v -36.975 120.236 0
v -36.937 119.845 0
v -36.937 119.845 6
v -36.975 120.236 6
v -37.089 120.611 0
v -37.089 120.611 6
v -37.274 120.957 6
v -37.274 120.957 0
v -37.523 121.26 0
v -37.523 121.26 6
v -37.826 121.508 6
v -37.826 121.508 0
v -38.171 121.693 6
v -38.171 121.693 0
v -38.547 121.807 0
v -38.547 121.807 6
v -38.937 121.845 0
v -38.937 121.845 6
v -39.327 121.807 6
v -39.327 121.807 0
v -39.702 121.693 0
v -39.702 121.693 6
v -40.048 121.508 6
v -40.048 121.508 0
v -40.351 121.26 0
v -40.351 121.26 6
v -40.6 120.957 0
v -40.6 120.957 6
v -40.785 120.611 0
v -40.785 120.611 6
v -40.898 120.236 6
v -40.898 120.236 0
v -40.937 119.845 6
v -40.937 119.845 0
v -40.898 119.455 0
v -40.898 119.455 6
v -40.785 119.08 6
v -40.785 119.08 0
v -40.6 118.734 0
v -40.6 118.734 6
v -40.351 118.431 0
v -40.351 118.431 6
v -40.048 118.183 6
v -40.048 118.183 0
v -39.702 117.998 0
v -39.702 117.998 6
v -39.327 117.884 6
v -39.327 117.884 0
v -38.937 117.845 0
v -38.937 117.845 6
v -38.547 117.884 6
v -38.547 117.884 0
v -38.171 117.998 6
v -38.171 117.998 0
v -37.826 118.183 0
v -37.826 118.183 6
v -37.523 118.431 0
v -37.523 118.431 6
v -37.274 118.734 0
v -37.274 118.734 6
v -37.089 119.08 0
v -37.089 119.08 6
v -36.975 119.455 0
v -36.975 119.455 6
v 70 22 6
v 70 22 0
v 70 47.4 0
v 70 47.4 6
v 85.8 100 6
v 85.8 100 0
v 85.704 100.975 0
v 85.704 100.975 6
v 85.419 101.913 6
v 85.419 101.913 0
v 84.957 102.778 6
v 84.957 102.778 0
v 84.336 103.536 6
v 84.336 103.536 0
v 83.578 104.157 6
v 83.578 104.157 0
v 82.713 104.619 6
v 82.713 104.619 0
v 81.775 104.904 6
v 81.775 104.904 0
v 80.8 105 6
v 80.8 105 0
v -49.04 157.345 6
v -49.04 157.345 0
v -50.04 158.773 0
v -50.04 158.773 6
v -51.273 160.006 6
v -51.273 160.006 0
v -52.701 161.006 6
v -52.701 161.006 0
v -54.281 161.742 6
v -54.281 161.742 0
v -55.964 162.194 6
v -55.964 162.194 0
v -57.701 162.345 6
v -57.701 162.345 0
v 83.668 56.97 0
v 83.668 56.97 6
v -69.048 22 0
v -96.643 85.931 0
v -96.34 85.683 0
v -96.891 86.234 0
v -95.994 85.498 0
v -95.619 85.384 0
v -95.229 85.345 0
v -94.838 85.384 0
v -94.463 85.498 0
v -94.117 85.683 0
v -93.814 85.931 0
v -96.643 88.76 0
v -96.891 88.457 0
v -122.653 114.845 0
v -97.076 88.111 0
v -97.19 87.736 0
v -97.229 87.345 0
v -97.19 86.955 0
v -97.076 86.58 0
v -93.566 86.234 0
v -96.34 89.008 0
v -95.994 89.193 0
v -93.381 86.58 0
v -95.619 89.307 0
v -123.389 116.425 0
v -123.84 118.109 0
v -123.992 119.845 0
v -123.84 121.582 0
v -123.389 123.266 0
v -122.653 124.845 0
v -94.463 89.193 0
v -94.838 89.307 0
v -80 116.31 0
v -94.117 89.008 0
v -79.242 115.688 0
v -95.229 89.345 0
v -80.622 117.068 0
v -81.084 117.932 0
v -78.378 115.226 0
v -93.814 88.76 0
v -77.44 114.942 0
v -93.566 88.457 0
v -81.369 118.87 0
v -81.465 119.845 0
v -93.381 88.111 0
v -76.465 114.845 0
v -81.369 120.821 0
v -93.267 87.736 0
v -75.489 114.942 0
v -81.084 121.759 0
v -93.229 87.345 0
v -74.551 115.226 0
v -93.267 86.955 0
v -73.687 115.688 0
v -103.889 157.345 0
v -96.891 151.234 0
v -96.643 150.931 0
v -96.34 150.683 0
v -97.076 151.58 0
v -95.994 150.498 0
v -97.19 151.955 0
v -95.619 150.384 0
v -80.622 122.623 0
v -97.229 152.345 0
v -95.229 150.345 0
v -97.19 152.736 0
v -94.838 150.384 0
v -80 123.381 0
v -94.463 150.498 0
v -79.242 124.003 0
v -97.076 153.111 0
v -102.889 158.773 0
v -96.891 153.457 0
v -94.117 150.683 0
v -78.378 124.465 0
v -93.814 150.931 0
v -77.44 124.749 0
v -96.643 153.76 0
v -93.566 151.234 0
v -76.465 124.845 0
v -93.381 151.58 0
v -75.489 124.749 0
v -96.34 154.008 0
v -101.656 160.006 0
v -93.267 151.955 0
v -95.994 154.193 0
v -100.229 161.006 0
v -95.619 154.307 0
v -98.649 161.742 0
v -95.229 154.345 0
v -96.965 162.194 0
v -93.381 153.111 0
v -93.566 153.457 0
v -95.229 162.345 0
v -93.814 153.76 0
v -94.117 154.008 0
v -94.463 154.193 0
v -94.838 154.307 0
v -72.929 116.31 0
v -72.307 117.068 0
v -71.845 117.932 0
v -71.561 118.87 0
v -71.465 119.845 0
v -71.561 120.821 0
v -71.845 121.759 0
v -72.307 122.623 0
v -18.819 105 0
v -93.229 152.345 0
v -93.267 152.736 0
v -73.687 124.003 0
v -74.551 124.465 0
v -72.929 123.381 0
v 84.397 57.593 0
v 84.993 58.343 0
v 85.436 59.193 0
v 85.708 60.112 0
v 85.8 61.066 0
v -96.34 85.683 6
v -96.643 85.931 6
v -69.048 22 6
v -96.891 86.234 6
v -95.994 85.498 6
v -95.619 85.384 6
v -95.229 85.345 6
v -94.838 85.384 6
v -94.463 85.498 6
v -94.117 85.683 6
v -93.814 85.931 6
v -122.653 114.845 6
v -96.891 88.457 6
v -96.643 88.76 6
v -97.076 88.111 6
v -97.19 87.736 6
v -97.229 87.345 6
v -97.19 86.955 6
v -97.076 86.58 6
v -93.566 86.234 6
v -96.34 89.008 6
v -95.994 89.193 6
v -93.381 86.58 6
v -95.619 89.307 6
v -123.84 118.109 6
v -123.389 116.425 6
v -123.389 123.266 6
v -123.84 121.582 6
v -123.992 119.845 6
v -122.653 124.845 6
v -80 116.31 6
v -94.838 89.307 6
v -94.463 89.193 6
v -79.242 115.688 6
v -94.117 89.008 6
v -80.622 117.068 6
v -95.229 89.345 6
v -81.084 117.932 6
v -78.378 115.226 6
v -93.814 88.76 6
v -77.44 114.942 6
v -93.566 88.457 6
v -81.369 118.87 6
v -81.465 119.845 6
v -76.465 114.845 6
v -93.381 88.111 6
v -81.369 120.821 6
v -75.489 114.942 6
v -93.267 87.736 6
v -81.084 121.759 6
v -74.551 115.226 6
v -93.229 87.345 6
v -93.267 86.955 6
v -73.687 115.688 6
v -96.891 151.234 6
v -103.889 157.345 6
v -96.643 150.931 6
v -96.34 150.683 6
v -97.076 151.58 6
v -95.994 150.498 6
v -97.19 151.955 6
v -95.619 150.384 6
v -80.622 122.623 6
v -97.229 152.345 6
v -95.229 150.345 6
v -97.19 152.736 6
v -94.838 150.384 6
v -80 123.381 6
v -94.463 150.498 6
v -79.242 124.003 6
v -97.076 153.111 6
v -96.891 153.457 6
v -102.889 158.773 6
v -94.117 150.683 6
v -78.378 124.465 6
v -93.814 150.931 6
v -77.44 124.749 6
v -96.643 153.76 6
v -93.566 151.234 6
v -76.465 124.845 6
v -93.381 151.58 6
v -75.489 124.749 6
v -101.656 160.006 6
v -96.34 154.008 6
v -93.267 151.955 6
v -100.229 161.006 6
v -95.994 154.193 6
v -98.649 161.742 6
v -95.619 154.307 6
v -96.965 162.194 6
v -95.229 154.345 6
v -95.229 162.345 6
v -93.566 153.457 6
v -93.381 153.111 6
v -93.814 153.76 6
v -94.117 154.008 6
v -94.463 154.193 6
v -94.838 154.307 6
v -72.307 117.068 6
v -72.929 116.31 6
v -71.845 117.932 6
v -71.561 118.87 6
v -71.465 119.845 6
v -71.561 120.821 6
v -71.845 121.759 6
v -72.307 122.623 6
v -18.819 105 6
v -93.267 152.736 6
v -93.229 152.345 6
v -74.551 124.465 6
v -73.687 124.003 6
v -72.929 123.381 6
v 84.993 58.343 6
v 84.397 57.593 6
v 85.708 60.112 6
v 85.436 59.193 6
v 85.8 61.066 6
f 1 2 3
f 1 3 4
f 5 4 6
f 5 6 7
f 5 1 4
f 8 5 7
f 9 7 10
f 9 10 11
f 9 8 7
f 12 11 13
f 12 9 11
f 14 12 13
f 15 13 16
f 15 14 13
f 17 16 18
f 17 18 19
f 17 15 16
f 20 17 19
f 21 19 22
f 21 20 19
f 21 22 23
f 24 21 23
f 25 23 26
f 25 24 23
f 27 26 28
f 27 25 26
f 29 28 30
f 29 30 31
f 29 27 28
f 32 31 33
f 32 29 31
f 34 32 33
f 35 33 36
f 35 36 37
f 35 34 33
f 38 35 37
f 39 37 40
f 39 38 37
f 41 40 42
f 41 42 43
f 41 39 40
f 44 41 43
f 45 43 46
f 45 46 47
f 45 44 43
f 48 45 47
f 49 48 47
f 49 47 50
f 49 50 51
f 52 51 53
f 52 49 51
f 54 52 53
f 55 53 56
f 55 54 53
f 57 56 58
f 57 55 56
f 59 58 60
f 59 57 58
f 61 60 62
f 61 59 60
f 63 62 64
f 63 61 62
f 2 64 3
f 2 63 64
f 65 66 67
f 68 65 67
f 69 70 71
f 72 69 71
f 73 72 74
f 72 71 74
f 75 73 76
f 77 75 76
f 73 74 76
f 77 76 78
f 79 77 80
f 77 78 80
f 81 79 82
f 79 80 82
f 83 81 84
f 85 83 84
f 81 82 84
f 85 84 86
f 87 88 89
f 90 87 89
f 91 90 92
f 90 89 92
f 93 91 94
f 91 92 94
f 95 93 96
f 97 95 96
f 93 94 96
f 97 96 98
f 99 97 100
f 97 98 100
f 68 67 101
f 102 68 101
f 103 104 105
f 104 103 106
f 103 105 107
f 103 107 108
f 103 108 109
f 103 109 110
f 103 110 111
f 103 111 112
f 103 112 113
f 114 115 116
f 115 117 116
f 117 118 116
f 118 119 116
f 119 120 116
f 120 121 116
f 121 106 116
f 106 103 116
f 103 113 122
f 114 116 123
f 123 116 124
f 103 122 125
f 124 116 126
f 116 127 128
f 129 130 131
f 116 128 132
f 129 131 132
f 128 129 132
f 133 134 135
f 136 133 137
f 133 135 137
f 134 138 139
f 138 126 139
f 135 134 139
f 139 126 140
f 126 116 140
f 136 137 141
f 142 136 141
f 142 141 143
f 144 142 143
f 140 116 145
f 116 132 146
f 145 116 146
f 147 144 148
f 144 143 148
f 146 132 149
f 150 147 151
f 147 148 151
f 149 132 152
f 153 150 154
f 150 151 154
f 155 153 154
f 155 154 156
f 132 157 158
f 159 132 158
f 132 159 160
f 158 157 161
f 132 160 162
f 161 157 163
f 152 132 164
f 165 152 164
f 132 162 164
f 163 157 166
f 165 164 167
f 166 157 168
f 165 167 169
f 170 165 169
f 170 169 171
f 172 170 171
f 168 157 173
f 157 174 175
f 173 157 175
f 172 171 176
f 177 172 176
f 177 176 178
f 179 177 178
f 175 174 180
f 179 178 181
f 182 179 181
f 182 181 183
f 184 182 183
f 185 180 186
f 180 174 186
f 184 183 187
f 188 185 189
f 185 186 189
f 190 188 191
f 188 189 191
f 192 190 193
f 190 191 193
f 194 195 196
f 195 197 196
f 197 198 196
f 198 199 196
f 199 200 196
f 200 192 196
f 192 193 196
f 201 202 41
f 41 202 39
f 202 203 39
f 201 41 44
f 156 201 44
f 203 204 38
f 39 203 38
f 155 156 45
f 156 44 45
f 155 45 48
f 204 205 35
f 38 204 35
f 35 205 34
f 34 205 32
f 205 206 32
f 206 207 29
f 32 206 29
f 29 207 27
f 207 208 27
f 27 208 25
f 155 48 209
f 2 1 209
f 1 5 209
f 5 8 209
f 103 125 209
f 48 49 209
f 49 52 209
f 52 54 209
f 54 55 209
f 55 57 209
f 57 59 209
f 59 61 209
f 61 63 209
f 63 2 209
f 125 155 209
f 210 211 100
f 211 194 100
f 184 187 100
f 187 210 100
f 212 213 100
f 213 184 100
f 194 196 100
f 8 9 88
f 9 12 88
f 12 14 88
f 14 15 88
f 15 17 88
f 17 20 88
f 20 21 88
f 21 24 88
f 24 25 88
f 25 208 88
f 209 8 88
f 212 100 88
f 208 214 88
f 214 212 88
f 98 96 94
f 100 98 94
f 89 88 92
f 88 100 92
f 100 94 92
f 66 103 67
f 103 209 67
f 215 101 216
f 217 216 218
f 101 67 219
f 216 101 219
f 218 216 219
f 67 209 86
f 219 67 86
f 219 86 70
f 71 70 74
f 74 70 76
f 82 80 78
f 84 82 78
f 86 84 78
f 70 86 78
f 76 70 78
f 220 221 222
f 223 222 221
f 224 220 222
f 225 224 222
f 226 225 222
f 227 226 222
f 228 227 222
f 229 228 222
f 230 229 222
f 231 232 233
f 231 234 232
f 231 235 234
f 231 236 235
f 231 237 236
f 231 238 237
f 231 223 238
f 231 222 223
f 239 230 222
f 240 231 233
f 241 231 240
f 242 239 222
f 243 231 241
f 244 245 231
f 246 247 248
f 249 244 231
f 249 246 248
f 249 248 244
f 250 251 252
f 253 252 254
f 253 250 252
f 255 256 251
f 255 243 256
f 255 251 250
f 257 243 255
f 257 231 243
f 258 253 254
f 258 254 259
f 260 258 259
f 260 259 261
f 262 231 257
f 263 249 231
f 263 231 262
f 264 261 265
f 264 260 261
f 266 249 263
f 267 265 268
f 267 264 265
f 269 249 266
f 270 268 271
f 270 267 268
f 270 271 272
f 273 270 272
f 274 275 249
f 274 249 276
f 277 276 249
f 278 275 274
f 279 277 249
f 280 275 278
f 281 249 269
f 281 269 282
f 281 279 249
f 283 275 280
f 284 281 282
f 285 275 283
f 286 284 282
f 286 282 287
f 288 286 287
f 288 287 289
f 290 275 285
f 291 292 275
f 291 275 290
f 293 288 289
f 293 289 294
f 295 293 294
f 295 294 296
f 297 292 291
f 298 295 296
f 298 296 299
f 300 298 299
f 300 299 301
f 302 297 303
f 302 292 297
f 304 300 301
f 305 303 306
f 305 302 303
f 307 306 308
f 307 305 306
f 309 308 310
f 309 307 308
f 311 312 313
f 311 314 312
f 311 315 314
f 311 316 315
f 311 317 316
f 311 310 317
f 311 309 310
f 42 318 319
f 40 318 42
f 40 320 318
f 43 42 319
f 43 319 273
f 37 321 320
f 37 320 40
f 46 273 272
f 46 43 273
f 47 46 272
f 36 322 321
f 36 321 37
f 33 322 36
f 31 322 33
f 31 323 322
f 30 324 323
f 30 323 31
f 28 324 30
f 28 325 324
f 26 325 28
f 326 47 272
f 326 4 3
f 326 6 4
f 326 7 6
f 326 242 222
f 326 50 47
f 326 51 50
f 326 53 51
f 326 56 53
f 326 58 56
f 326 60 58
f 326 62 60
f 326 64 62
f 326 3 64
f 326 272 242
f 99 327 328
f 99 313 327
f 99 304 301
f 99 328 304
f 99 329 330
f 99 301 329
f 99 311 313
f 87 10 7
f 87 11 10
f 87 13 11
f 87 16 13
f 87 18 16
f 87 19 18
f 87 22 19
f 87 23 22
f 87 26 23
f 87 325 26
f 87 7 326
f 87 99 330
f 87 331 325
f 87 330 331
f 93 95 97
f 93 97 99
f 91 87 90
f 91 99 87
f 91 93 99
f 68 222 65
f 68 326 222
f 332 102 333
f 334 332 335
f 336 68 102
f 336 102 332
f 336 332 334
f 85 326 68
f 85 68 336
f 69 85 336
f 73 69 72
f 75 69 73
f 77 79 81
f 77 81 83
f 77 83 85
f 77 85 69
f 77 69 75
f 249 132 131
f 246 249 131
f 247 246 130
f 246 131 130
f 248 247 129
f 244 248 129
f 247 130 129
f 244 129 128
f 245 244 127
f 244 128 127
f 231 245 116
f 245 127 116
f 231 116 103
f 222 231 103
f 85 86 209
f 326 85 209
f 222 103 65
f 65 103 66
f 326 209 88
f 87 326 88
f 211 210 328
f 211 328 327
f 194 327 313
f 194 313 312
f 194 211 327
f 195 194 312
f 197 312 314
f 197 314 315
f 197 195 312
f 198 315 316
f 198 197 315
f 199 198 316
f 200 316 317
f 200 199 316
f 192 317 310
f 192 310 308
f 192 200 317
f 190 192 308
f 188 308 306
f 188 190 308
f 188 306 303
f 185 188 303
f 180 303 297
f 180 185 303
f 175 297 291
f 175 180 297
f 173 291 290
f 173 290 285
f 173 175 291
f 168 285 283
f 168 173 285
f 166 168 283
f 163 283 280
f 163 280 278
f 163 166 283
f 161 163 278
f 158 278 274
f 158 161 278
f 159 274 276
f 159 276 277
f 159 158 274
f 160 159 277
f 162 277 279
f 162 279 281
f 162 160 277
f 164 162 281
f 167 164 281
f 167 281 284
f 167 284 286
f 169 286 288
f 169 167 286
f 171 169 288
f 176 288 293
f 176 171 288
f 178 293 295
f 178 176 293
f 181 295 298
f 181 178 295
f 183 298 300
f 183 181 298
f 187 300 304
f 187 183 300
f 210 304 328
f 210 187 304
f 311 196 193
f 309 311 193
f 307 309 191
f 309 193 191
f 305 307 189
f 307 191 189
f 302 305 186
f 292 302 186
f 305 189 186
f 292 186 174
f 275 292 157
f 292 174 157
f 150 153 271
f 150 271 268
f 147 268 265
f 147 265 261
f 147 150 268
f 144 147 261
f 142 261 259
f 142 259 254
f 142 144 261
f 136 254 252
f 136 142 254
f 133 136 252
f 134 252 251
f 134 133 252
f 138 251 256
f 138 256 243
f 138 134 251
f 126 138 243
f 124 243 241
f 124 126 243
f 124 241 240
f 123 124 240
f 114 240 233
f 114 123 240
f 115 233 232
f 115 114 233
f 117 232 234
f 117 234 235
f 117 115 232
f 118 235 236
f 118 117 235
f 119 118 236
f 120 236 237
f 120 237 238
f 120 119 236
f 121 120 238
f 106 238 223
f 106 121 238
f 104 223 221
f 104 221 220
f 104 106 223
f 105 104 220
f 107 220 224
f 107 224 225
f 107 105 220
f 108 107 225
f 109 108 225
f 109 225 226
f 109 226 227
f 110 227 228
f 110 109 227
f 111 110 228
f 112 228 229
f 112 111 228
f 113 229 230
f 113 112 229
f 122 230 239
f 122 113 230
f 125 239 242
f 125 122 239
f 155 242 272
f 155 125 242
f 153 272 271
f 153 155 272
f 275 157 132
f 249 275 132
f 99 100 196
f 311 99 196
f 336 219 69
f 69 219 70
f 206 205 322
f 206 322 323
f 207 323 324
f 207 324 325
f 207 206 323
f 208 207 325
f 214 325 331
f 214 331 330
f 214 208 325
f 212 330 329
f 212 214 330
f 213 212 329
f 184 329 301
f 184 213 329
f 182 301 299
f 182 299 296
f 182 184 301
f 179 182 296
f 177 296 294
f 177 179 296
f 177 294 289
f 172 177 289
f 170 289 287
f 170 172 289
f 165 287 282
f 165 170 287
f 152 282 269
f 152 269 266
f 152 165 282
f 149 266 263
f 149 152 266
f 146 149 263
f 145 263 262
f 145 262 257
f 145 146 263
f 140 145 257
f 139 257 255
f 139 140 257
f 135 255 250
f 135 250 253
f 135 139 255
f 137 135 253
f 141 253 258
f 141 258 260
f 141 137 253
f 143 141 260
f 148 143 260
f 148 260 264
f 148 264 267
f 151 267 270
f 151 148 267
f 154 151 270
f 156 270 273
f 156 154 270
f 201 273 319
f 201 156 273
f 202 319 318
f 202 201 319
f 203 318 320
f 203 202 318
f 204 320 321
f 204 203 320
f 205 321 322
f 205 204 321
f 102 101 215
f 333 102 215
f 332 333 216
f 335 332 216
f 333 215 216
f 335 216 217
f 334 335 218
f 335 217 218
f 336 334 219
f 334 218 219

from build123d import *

# Parameters (mm, degrees)
SKETCH1_R           = 2
SKETCH1_R_2         = 5
BOSS_EXTRUDE1_DEPTH = 6


with BuildPart() as part:
    # Sketch1 → Boss-Extrude1 (new body)
    with BuildSketch(Plane.XY):
        with BuildLine():
            Line((-122.652649312, 114.845498823), (-69.048275573, 22))
            Line((-69.048275573, 22), (70, 22))
            Line((70, 22), (70, 47.4))
            Line((70, 47.4), (83.667882182, 56.970354135))
            ThreePointArc((83.667882182, 56.970354135), (85.235054166, 58.75737129), (85.8, 61.066114356))
            Line((85.8, 61.066114356), (85.8, 100))
            ThreePointArc((85.8, 100), (84.335533906, 103.535533906), (80.8, 105))
            Line((80.8, 105), (-18.818802154, 105))
            Line((-18.818802154, 105), (-49.04048999, 157.345498823))
            ThreePointArc((-49.04048999, 157.345498823), (-52.700744028, 161.005752861), (-57.700744028, 162.345498823))
            Line((-57.700744028, 162.345498823), (-95.228511525, 162.345498823))
            ThreePointArc((-95.228511525, 162.345498823), (-100.228511525, 161.005752861), (-103.888765563, 157.345498823))
            Line((-103.888765563, 157.345498823), (-122.652649312, 124.845498823))
            ThreePointArc((-122.652649312, 124.845498823), (-123.992395274, 119.845498823), (-122.652649312, 114.845498823))
        make_face()
        with Locations((-95.228511525, 87.345498823)):
            Circle(SKETCH1_R, mode=Mode.SUBTRACT)
        with Locations((-38.936860279, 119.845498823)):
            Circle(SKETCH1_R, mode=Mode.SUBTRACT)
        with Locations((-76.464627777, 119.845498823)):
            Circle(SKETCH1_R_2, mode=Mode.SUBTRACT)
        with Locations((-95.228511525, 152.345498823)):
            Circle(SKETCH1_R, mode=Mode.SUBTRACT)
    extrude(amount=BOSS_EXTRUDE1_DEPTH)


solid = part.part
